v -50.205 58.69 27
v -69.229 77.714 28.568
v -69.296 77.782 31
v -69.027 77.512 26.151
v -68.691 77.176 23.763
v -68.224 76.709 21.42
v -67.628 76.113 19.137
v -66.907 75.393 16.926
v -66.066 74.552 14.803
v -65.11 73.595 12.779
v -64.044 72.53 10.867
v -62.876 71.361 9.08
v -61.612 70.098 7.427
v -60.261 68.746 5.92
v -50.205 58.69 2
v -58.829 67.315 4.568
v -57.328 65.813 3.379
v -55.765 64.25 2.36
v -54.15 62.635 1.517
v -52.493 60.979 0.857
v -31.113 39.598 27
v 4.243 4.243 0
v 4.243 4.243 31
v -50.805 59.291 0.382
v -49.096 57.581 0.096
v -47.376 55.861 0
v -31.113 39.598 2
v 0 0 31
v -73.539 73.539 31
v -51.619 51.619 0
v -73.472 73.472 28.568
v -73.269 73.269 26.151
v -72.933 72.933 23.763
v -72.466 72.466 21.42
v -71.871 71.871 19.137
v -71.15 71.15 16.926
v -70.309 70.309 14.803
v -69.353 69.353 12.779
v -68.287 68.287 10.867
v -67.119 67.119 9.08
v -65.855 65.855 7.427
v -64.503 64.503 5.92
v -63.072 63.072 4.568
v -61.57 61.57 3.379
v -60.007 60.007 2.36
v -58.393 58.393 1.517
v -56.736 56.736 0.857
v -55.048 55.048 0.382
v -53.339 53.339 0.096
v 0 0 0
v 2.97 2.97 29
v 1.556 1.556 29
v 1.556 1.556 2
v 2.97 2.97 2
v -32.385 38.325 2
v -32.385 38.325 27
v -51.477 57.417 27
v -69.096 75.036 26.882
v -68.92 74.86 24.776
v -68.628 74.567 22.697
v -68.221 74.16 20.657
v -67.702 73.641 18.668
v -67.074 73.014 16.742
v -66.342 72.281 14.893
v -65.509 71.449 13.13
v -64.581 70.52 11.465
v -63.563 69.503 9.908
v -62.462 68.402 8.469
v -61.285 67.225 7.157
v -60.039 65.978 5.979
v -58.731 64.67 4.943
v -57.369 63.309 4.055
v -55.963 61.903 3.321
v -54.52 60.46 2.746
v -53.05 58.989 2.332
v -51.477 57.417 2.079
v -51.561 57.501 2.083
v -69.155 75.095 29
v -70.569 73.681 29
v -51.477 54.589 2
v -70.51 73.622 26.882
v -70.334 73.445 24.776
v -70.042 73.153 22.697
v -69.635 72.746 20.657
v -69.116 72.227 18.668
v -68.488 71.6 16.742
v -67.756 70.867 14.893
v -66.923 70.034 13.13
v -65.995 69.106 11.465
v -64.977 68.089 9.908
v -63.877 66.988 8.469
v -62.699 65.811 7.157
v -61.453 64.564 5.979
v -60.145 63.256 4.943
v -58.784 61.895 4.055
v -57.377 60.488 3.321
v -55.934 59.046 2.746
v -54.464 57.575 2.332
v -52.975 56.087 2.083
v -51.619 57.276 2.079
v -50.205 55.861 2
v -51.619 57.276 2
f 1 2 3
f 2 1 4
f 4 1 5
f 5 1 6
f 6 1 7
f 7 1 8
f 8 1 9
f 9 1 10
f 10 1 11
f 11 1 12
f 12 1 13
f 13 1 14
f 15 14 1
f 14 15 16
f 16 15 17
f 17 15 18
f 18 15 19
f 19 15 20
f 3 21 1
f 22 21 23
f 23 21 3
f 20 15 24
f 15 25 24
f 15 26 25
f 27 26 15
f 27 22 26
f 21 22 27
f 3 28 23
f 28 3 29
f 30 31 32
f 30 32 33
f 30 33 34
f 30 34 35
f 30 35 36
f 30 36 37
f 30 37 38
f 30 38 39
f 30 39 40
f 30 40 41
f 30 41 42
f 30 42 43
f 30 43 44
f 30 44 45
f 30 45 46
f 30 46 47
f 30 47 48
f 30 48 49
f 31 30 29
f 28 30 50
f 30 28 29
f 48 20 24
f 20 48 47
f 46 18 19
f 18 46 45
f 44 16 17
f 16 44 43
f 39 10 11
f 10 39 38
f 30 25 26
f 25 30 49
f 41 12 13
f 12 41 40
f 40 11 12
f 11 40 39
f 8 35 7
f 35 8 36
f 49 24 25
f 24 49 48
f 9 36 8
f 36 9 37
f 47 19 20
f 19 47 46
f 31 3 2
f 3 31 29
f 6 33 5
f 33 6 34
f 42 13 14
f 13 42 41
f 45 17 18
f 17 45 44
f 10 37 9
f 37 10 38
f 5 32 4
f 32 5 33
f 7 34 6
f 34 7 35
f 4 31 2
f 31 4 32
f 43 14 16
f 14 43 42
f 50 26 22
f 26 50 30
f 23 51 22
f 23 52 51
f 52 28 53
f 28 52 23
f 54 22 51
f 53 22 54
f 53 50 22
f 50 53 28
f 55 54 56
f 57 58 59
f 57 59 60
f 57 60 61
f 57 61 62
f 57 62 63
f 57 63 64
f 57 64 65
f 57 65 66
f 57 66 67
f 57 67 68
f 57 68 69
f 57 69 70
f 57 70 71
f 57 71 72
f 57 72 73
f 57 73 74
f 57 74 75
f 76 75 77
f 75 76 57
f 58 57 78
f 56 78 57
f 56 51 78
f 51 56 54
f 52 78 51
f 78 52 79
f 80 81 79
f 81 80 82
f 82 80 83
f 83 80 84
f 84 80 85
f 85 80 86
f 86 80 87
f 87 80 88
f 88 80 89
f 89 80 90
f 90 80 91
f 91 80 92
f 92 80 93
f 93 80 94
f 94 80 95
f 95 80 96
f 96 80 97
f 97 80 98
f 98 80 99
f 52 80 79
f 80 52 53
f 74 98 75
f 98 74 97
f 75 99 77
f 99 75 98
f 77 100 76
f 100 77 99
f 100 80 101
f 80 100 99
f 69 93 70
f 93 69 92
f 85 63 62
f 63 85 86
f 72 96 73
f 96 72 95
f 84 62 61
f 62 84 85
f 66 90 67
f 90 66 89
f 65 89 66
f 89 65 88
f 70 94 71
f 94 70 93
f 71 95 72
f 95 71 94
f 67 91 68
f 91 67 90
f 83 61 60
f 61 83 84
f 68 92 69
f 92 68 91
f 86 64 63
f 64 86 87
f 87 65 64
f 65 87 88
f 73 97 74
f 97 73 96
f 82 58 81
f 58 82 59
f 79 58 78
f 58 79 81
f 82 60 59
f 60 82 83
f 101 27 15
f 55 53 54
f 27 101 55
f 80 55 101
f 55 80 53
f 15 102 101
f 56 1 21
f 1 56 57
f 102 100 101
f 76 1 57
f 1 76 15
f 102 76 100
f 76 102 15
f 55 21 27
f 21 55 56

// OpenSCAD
// [FL_INDEX: keywords="openscad, 3d_parametric, Parametric_Kitchen_Knife_Sheath, csg_solid" | COT="Parametric OpenSCAD design from 3DCodeverse"]
// Title: Parametric Kitchen Knife Sheath

// parametric knife sheath

// length: the length of the blade from handle to tip
// maxwidth: the maximum width of the blade
// tipwidth:  the width near the tip, zero means it comes to a point
// thickness: maximum thickness of the blade
// show:  0 = do not put a window to show the blade style
//
// all measurements are in mm

//CUSTOMIZER VARIABLES

//	Knife length, mm
knife_length = 100;	//	[25:350]

//	Knife Max Blade width, mm
knife_width = 25;	//	[10:100]

//	Knife thickness, mm
knife_thickness = 2.0;	//	[1:5]

// Show knife through window?
knife_show = 1; // [0:No, 1:Yes]

//CUSTOMIZER VARIABLES END

$fn = 80*1;  // while debugging reduce this to 20 to save time

wall = 2*1;
pad = 2*1;

rotate([0,0,45])
	parasheath(length=knife_length, maxwidth=knife_width, thickness=knife_thickness, show=knife_show);


module parasheath(length=200, maxwidth=25, thickness=2, show=1) {

	difference() {

		// first make an oversized blade, oversized by 2 times the wall thickness

		blade(len=length+wall+pad,maxwid=maxwidth+pad+2*wall,thick=thickness+2*wall);

		translate([wall+0.2,-0.1,wall]) 
			blade(len=length+0.1+pad, maxwid=maxwidth+pad, thick=thickness);

		if (show) {
			translate([thickness+wall,length-2*maxwidth,wall]) 
			 		cube([100,wall+maxwidth,maxwidth]);
		}
	}

}

module blade(len=200, maxwid=25, tipwid=5, thick=2) {

	union() {
		intersection() {
				// first make a cube
				cube([thick, len, maxwid]);
	
				translate([0,len-maxwid,maxwid]) 
					rotate([0,90,0]) 
						cylinder(r=maxwid,h=thick*3,center=true);
		}

		cube([thick,len-maxwid,maxwid]);
	}
}
